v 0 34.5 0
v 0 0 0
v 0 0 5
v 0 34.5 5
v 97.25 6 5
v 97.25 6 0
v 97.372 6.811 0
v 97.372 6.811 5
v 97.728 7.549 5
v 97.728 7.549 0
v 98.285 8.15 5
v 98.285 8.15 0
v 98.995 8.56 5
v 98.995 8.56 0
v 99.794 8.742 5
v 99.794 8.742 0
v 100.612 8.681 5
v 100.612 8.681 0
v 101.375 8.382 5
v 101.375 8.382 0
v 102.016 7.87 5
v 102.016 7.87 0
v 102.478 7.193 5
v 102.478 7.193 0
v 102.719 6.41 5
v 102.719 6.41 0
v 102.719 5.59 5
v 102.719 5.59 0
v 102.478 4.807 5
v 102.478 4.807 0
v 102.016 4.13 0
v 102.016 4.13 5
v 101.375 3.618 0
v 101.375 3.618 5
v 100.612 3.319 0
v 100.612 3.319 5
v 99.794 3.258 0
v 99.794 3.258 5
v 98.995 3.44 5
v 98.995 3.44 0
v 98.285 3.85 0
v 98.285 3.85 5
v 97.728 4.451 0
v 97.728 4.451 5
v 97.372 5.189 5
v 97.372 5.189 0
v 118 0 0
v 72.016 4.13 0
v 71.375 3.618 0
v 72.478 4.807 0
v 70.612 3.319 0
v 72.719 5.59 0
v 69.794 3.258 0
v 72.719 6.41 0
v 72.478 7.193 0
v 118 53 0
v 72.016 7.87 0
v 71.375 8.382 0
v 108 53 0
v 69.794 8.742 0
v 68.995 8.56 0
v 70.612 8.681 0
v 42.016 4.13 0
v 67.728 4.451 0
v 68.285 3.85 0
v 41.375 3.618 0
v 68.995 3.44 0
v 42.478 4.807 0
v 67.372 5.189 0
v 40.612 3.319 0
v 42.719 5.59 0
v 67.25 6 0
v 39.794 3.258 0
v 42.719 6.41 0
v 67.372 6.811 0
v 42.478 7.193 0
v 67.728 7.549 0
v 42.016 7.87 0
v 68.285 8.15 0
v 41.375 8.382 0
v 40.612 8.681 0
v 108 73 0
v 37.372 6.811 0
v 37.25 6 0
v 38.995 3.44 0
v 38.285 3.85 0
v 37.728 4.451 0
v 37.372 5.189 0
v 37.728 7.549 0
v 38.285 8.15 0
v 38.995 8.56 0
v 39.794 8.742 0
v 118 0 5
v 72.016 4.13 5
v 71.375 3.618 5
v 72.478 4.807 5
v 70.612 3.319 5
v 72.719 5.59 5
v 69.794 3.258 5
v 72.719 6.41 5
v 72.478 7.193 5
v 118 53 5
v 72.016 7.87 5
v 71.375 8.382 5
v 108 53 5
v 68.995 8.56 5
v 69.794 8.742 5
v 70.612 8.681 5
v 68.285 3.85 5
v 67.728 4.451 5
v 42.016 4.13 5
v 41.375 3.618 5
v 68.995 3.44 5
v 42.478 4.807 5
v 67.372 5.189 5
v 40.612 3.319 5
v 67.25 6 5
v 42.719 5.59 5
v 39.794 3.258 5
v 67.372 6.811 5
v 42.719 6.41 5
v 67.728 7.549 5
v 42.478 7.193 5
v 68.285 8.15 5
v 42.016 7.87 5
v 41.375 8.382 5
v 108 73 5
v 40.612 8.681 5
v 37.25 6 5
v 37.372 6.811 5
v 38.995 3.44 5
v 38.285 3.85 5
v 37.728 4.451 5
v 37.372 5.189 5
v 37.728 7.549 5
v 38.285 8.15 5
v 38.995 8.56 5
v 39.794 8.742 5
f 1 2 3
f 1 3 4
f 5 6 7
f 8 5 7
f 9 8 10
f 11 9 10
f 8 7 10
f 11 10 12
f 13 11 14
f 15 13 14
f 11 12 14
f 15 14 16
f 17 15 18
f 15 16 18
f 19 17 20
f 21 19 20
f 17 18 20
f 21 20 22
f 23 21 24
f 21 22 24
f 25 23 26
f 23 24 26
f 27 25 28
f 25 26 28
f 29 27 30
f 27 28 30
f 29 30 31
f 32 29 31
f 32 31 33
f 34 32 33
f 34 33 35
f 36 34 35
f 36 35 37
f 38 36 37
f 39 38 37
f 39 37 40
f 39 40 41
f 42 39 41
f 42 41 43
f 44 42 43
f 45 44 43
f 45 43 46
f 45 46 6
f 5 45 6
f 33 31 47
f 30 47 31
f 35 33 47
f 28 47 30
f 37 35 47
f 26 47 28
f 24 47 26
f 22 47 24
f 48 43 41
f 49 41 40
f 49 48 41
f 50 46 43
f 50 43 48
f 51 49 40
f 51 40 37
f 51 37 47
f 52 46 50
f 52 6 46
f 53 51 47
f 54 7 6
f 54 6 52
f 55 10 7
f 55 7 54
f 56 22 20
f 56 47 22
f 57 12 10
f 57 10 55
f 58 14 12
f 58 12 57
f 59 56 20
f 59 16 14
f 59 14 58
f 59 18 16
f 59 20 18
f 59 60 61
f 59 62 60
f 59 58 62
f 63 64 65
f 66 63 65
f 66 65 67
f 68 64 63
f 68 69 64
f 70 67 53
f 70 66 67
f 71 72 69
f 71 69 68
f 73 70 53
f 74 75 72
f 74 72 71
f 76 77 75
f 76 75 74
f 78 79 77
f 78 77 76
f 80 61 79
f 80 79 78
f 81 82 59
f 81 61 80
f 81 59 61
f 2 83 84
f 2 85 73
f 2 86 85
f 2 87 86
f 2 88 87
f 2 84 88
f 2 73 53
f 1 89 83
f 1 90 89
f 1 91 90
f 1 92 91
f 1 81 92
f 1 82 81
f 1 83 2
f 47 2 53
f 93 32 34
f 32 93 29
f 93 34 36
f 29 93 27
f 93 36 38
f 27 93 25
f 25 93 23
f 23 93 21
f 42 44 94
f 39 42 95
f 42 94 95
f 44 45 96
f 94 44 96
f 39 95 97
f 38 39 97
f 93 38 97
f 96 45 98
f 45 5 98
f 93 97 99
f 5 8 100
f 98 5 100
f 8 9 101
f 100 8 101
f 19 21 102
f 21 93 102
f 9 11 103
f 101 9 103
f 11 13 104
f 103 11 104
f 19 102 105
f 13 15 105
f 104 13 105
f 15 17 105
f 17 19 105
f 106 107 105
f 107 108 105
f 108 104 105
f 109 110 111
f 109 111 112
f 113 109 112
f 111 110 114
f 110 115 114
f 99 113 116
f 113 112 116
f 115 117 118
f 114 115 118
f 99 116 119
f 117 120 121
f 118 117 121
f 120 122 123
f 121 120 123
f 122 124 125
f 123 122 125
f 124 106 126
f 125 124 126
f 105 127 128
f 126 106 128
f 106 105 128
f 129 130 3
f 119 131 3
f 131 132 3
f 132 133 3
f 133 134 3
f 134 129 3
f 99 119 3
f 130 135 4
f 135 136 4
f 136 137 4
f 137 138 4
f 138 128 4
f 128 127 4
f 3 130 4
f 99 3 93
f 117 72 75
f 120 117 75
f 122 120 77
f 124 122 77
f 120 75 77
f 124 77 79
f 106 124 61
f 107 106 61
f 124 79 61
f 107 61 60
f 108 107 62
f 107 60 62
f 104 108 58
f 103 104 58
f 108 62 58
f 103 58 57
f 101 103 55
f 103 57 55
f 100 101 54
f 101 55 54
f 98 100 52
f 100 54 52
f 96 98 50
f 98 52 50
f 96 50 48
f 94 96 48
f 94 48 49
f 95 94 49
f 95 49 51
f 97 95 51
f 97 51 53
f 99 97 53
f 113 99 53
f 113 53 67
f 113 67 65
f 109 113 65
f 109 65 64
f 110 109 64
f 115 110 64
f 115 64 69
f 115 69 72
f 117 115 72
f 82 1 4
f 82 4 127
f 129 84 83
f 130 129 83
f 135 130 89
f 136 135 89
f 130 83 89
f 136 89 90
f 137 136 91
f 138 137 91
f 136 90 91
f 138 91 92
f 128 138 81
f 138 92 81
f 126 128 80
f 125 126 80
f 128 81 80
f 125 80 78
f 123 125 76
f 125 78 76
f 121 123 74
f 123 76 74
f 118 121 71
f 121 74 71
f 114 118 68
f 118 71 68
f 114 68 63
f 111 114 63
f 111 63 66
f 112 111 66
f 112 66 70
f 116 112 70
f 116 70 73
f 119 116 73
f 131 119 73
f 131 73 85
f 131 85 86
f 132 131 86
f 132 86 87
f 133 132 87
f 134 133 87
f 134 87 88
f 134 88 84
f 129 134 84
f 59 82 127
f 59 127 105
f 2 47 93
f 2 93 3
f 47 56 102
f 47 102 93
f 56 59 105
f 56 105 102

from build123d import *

# Parameters (mm, degrees)
RESSALTO_EXTRUS_O1_DEPTH = 5
FURO_COM_FOLGA_DE_M51_D  = 5.5


with BuildPart() as part:
    # Esboço1 → Ressalto-extrusão1 (new body)
    with BuildSketch(Plane.XY):
        Polygon((0, 0), (0, 34.5), (108, 73), (108, 53), (118, 53), (118, 0), align=None)
    extrude(amount=RESSALTO_EXTRUS_O1_DEPTH)

    # Furo com folga de M51 (through all)
    with Locations(Plane.XY.offset(5)):
        with Locations((100, 6), (70, 6), (40, 6)):
            Hole(FURO_COM_FOLGA_DE_M51_D / 2)


solid = part.part
